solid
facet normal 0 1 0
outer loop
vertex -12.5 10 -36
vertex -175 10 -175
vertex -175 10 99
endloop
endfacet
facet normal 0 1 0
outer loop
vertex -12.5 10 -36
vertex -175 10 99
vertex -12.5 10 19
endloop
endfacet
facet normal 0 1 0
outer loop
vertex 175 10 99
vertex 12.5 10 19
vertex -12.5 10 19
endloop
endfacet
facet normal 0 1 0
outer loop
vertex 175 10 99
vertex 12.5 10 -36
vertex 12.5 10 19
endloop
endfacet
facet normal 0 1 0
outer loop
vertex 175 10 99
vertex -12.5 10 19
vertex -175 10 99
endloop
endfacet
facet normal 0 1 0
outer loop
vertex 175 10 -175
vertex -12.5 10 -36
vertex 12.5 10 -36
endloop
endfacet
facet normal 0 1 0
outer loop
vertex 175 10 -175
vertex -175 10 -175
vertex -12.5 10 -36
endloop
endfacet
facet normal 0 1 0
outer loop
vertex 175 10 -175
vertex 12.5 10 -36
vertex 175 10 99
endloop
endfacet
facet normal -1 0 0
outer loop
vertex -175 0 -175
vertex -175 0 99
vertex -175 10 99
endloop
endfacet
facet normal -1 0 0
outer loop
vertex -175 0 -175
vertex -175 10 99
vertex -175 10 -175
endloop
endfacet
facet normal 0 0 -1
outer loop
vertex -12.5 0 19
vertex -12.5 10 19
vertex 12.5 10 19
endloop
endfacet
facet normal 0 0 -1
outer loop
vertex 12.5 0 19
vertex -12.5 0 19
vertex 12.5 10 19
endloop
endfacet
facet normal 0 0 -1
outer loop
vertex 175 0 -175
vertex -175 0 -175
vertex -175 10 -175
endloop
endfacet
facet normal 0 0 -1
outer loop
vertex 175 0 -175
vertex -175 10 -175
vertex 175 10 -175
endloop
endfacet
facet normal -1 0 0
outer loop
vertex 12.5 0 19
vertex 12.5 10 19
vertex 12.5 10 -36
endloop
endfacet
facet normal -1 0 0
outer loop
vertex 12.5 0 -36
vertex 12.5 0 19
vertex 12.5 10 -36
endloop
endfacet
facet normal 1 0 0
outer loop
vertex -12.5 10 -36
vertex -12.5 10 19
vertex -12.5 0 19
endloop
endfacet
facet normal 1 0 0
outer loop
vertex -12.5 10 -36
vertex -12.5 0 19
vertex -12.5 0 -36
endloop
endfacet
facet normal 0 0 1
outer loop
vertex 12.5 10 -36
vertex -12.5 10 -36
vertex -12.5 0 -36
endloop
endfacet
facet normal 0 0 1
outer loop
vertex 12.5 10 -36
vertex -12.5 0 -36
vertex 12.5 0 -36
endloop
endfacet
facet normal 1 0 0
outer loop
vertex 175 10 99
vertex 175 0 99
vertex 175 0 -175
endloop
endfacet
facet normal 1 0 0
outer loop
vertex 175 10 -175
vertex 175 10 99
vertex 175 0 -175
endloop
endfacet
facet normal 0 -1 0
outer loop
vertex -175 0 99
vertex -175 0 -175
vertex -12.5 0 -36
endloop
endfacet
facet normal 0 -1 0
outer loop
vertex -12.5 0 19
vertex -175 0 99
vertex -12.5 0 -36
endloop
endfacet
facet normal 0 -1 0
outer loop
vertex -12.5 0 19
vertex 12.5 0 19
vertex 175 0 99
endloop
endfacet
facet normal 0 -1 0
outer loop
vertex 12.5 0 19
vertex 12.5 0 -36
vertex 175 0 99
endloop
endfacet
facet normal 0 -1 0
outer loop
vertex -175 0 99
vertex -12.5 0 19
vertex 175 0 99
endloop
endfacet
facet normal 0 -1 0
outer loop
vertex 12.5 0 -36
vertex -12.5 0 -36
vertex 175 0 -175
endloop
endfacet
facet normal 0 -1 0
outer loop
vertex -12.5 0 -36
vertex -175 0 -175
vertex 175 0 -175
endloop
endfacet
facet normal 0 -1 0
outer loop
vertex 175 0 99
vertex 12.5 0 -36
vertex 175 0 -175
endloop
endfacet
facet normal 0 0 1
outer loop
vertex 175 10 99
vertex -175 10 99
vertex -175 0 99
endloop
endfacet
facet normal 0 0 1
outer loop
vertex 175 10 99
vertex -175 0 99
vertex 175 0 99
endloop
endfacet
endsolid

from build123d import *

# Parameters (mm, degrees)
SKETCH1_W           = 350
SKETCH1_H           = 350
BOSS_EXTRUDE1_DEPTH = 10
SKETCH3_W           = 350
SKETCH3_H           = 76
CUT_EXTRUDE1_DEPTH  = 10
SKETCH4_W           = 25
SKETCH4_H           = 55
CUT_EXTRUDE2_DEPTH  = 10


with BuildPart() as part:
    # Sketch1 → Boss-Extrude1 (new body)
    with BuildSketch(Plane(origin=(0, 0, 0), x_dir=(1, 0, 0), z_dir=(0, 1, 0))):
        Rectangle(SKETCH1_W, SKETCH1_H)
    extrude(amount=BOSS_EXTRUDE1_DEPTH)

    # Sketch3 → Cut-Extrude1 (cut)
    with BuildSketch(Plane(origin=(0, 10, 0), x_dir=(1, 0, 0), z_dir=(0, 1, 0))):
        with Locations((0, -137)):
            Rectangle(SKETCH3_W, SKETCH3_H)
    extrude(amount=-CUT_EXTRUDE1_DEPTH, mode=Mode.SUBTRACT)

    # Sketch4 → Cut-Extrude2 (cut)
    with BuildSketch(Plane(origin=(0, 10, 0), x_dir=(1, 0, 0), z_dir=(0, 1, 0))):
        with Locations((0, 8.5)):
            Rectangle(SKETCH4_W, SKETCH4_H)
    extrude(amount=-CUT_EXTRUDE2_DEPTH, mode=Mode.SUBTRACT)


solid = part.part
